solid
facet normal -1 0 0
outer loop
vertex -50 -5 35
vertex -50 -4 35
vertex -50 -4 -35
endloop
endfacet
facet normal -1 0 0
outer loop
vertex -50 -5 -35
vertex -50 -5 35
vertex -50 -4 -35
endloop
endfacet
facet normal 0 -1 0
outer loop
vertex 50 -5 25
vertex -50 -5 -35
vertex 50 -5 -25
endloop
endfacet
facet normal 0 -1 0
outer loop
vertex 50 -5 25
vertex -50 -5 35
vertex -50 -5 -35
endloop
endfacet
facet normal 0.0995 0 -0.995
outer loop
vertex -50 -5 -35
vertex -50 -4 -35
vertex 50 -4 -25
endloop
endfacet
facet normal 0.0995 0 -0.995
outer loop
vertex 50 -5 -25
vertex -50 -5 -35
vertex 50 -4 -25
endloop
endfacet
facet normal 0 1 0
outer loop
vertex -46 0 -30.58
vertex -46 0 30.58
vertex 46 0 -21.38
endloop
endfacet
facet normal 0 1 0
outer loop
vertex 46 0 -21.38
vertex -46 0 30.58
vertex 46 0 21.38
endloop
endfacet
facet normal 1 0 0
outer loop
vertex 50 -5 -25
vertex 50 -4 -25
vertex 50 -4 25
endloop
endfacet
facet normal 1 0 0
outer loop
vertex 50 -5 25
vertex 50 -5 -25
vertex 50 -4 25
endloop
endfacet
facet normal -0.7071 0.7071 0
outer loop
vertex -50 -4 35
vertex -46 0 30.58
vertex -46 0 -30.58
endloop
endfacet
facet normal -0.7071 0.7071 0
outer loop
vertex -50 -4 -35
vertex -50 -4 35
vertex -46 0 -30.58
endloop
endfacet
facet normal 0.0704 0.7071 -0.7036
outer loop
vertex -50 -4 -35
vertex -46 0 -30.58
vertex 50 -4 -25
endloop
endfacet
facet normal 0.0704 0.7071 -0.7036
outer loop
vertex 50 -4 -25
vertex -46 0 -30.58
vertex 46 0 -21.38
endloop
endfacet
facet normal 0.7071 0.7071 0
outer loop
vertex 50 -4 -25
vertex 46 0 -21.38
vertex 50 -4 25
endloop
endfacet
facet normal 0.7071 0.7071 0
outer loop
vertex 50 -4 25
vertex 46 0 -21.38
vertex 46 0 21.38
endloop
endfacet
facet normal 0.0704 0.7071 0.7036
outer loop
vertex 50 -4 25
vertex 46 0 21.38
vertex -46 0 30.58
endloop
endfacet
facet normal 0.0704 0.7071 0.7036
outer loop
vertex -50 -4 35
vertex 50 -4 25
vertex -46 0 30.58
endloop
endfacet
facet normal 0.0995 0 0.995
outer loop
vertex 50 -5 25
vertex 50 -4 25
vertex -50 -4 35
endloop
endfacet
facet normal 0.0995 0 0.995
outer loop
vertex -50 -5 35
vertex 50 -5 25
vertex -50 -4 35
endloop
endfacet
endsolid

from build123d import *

# Parameters (mm, degrees)
PAD_DEPTH    = 5
CHAMFER_SIZE = 4


with BuildPart() as part:
    # Sketch → Pad (new body)
    with BuildSketch(Plane.XZ):
        Polygon((-50, -35), (50, -25), (50, 25), (-50, 35), align=None)
    extrude(amount=PAD_DEPTH)

    # Chamfer
    chamfer_edges = [part.edges().sort_by_distance(p)[0] for p in [
        (0, 0, 30),
        (50, 0, 0),
        (0, 0, -30),
        (-50, 0, 0),
    ]]
    chamfer(chamfer_edges, length=CHAMFER_SIZE)


solid = part.part
